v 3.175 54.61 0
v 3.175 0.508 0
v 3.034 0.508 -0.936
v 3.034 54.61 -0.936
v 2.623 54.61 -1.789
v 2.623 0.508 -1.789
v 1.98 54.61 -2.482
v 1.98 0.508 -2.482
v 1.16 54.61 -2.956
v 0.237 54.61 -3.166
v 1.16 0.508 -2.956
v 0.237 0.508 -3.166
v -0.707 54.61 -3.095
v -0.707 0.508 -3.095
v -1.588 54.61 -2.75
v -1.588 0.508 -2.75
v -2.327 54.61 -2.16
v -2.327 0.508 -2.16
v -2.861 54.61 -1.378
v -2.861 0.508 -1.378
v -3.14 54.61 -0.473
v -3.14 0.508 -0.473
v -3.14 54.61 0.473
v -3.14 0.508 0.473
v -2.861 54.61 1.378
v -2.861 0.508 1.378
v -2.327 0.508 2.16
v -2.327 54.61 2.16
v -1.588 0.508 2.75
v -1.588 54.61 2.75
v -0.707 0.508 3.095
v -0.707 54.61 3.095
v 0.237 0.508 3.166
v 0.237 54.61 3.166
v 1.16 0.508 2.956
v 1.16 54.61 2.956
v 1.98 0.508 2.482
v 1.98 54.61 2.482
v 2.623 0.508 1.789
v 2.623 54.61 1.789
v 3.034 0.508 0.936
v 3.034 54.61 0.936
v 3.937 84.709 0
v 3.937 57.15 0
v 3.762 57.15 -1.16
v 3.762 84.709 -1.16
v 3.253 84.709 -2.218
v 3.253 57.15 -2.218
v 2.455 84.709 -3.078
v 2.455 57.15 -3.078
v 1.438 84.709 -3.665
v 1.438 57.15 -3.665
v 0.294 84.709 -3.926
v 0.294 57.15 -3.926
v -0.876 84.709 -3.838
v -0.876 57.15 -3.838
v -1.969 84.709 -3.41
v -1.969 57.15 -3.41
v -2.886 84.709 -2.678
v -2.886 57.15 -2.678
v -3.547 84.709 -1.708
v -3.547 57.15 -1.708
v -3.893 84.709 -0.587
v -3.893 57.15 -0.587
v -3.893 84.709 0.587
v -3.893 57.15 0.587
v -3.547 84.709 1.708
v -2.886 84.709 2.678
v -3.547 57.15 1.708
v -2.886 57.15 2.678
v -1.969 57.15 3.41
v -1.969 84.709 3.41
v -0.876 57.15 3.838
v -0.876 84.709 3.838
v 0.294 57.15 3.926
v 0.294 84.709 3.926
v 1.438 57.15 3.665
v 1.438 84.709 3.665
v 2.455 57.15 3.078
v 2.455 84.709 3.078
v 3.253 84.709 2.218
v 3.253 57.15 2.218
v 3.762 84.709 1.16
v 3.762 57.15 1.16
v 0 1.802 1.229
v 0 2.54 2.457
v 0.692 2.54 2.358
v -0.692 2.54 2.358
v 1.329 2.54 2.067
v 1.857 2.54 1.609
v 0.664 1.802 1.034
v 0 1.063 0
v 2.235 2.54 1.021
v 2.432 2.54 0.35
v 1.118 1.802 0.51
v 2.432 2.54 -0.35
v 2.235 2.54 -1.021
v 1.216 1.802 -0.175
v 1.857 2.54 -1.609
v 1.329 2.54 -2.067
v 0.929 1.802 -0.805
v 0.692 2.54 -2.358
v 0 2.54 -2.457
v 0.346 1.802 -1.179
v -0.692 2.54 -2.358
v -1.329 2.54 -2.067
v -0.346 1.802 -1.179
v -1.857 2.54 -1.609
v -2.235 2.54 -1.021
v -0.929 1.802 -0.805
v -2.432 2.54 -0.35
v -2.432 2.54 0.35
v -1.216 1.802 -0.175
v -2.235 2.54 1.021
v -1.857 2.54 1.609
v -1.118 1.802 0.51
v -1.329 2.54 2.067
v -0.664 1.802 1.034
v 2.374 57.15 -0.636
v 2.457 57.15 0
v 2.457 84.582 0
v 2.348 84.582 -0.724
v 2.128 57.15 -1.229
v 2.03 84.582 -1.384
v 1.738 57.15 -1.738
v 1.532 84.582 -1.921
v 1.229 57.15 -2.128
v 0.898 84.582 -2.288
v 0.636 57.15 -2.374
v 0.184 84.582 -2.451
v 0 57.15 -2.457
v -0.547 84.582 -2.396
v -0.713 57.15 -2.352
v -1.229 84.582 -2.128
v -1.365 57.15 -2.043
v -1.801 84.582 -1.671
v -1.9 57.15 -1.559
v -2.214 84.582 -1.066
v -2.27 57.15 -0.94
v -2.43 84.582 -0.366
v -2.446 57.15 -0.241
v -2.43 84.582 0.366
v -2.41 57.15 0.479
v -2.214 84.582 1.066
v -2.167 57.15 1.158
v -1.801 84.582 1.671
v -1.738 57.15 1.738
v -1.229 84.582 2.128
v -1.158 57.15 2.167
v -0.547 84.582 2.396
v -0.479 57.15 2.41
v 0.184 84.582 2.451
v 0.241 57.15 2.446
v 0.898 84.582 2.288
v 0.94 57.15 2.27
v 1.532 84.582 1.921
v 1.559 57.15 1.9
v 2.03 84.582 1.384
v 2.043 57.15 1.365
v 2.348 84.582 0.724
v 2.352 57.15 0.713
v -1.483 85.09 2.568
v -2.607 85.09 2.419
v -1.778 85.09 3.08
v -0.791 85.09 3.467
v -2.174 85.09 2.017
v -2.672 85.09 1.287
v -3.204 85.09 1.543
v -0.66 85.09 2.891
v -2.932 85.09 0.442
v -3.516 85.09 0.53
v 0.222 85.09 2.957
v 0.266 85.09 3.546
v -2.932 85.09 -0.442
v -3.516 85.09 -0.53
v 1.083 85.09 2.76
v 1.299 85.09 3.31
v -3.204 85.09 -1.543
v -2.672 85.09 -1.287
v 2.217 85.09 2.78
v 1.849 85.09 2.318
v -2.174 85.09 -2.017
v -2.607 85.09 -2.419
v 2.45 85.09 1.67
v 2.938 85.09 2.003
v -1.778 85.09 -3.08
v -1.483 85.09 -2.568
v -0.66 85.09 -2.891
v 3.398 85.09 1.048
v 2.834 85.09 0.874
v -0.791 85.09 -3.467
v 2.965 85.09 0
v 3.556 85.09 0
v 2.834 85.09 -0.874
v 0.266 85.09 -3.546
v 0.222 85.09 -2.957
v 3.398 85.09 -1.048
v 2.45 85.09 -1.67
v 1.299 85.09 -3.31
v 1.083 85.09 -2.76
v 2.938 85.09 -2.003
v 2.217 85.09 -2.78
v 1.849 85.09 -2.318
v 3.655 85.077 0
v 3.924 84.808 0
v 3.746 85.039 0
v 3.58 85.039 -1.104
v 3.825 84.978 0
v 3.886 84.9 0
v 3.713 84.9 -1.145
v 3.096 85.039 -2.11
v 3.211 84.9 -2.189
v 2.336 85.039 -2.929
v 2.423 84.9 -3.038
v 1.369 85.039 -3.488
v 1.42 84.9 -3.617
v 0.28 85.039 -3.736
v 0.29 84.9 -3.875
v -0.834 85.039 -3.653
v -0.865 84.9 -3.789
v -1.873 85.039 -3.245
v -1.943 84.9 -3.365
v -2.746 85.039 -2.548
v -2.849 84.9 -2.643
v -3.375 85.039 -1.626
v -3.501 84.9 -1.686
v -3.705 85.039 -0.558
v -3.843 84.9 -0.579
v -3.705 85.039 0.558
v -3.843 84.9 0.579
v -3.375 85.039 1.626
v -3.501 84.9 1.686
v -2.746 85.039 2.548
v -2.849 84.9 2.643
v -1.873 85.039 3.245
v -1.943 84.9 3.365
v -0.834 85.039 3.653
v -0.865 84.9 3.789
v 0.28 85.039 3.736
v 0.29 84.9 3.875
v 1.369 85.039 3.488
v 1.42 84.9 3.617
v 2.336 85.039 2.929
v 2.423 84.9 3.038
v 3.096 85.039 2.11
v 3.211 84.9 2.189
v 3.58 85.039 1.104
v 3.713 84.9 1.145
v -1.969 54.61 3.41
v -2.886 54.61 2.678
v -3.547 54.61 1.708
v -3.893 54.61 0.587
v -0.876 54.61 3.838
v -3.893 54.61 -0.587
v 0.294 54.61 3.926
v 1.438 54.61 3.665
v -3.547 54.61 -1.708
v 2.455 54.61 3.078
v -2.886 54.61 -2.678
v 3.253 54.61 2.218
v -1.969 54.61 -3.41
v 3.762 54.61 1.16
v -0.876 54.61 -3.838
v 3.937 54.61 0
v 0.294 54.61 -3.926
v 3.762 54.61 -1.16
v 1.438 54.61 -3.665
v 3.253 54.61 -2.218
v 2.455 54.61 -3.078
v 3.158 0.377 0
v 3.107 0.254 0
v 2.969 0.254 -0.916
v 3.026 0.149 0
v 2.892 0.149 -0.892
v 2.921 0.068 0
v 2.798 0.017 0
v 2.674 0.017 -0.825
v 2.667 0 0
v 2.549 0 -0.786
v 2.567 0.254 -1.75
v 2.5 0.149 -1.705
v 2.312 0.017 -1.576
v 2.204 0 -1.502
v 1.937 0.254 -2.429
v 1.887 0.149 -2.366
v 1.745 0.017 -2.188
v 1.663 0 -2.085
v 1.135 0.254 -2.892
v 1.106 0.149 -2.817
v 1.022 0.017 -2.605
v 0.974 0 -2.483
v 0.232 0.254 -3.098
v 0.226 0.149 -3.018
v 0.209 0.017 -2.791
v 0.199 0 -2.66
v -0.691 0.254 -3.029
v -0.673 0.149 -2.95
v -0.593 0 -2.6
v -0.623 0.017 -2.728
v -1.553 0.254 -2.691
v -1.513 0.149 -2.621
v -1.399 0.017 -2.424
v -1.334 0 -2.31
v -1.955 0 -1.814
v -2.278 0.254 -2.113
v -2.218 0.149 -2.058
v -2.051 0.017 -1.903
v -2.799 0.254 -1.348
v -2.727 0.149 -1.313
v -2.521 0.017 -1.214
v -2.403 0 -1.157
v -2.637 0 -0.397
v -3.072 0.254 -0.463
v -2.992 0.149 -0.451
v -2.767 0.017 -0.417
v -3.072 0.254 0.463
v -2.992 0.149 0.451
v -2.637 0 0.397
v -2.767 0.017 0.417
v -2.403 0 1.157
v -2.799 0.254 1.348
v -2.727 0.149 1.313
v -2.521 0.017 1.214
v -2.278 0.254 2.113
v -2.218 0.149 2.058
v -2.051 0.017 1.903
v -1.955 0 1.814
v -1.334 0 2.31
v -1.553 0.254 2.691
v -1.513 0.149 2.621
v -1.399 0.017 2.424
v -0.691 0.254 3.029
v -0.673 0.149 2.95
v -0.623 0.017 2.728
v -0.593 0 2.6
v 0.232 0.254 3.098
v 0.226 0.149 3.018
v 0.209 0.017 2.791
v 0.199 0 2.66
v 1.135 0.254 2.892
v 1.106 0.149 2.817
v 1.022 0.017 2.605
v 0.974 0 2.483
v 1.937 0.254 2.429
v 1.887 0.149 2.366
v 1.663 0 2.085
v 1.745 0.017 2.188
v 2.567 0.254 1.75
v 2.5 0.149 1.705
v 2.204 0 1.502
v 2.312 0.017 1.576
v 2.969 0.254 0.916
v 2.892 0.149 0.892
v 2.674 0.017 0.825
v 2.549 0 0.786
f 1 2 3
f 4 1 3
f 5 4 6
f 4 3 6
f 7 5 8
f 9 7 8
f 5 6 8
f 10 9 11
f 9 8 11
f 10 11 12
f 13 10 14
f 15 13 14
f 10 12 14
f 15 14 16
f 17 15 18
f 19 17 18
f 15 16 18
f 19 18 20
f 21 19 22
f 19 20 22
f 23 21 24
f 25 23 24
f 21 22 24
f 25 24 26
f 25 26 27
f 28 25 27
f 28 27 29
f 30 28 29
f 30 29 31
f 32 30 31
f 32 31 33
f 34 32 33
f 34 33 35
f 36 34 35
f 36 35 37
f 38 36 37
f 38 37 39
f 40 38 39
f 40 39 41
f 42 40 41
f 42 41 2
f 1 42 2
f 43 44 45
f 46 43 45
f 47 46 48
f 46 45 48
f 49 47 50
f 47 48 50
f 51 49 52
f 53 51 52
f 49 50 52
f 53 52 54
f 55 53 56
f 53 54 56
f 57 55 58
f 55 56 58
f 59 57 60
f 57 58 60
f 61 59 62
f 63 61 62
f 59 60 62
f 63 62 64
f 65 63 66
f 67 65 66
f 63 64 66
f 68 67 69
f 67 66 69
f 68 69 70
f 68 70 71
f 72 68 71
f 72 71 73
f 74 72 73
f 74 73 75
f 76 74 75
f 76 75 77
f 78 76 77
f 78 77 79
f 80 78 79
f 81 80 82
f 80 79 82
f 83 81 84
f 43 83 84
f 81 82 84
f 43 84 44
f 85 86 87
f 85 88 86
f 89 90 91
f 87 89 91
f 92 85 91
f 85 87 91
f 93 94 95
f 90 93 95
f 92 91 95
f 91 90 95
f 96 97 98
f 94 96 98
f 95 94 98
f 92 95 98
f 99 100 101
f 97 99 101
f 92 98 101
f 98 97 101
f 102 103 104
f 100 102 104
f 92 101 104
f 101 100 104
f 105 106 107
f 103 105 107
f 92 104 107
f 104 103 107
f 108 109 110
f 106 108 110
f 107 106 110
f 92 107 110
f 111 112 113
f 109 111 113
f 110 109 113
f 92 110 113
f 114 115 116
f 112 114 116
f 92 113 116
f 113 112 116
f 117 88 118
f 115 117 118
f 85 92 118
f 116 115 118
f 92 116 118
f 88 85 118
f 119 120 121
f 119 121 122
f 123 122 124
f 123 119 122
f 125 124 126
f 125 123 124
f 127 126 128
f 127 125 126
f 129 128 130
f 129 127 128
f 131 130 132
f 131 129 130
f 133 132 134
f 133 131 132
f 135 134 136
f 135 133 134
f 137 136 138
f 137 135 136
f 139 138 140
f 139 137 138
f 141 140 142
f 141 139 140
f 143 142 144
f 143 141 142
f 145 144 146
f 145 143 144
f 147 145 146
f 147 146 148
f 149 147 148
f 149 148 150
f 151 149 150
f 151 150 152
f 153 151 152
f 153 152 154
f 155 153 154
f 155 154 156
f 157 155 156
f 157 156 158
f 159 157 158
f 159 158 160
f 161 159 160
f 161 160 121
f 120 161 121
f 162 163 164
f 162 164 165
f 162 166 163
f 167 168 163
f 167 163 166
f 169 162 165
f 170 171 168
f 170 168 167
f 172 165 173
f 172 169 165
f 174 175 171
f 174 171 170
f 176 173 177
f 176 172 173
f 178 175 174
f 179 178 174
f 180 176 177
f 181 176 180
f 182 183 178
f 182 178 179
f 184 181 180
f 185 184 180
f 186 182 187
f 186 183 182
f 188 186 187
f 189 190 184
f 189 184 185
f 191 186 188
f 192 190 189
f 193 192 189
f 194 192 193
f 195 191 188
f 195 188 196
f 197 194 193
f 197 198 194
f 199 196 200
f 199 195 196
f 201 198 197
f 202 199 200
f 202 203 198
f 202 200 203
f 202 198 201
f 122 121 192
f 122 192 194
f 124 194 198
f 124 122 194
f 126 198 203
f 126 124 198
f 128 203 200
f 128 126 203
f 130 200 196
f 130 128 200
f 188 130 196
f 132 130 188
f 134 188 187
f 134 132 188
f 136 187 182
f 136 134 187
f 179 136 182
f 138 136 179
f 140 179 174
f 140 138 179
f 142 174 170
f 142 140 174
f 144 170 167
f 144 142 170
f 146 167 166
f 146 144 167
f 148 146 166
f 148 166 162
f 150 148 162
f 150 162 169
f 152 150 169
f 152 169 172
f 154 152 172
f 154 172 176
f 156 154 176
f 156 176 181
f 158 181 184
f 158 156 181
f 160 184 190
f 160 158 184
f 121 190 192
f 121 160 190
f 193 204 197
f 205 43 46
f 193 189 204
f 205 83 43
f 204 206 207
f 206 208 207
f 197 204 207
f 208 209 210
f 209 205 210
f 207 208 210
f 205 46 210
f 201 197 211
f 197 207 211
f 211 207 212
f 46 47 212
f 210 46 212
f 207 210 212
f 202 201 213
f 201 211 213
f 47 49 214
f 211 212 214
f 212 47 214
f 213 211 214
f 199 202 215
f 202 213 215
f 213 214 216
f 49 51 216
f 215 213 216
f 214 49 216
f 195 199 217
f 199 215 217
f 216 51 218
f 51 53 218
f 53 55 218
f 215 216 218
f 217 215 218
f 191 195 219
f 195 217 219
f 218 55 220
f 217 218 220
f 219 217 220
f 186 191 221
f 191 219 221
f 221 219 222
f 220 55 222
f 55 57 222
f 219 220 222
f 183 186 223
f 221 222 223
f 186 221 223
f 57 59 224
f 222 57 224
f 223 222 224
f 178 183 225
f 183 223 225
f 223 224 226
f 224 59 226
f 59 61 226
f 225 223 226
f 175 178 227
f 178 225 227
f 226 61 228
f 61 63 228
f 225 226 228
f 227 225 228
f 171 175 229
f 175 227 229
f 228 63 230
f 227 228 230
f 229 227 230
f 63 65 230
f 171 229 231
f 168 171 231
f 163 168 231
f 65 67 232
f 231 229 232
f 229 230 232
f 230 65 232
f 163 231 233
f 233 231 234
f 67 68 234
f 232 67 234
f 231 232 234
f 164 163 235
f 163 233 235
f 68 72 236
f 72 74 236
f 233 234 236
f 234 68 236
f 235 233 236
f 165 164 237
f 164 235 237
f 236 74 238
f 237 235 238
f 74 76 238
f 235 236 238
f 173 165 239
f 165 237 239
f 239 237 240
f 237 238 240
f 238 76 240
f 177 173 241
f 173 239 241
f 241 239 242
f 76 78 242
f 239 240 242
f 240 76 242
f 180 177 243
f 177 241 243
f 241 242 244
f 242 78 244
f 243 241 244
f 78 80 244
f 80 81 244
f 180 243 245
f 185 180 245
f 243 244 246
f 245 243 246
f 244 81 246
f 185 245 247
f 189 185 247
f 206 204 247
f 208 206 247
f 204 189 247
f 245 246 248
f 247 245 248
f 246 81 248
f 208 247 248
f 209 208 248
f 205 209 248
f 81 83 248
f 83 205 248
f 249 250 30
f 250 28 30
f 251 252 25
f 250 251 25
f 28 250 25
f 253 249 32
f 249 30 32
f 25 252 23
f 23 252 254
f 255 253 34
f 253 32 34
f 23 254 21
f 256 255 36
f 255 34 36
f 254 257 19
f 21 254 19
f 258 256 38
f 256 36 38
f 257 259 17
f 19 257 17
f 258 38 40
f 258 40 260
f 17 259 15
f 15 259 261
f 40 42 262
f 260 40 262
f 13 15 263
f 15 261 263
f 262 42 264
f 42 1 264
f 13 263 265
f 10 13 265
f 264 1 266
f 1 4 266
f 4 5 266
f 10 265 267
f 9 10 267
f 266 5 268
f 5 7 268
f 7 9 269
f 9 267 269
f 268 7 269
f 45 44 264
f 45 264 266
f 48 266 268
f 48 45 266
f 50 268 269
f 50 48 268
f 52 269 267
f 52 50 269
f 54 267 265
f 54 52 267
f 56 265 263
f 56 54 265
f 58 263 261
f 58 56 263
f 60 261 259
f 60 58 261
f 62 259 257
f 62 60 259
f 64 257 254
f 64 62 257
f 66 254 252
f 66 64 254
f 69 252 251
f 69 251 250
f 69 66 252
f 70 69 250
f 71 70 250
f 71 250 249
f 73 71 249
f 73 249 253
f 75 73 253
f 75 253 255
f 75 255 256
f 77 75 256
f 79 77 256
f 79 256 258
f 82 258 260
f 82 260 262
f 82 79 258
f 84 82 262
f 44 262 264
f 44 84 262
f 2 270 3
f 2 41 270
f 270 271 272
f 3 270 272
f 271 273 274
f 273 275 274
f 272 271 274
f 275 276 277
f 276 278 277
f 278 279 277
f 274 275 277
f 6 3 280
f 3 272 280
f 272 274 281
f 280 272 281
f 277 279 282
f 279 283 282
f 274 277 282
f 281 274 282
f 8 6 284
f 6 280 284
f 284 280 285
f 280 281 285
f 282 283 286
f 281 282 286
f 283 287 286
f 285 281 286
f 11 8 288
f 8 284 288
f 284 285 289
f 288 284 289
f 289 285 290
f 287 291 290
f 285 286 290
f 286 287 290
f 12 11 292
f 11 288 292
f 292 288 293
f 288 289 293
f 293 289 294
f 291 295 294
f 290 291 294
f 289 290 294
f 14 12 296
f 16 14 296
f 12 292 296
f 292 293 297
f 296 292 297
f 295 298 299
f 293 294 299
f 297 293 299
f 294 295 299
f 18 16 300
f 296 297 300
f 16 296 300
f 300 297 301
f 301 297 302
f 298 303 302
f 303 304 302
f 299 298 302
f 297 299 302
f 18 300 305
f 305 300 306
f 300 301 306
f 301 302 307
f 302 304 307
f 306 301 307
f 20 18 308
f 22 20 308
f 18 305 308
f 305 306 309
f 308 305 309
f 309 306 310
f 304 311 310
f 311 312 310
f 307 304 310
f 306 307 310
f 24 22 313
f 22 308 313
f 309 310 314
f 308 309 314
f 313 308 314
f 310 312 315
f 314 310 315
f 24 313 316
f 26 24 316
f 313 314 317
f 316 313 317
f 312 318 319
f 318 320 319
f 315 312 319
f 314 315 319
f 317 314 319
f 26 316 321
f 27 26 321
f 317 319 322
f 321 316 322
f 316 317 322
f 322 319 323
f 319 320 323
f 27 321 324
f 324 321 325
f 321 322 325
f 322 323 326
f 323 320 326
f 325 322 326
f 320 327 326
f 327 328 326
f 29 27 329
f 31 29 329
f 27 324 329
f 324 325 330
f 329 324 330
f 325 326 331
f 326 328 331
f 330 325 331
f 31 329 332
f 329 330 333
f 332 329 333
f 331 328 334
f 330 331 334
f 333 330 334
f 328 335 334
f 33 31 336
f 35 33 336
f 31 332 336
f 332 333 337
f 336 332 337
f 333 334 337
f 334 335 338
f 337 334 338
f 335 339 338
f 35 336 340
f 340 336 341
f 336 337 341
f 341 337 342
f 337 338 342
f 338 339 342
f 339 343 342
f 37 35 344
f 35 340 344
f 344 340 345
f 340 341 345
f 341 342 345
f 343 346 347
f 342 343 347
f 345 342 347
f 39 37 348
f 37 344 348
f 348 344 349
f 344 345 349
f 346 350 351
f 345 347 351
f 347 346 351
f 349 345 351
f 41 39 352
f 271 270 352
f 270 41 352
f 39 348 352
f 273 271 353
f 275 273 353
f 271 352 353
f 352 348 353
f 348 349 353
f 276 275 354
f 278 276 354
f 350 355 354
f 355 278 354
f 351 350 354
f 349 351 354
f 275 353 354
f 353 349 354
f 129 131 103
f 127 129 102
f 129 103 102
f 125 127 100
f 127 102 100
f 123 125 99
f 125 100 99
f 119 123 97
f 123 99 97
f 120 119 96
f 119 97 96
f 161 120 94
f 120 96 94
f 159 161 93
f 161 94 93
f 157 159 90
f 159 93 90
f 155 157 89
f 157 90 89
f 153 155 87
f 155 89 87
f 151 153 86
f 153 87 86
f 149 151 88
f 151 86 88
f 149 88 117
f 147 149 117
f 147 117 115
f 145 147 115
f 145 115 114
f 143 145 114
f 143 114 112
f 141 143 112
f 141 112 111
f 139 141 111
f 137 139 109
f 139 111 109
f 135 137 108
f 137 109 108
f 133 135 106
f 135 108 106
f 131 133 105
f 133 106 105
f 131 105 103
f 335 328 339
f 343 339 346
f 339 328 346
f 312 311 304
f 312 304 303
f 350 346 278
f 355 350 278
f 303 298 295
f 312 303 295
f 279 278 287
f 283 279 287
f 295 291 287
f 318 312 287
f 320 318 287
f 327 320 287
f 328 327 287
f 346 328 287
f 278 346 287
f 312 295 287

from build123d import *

# Parameters (mm, degrees)
SKETCH1_R                        = 3.175
BOSS_EXTRUDE1_DEPTH              = 57.15
F_10_0_1935_DIAMETER_HOLE1_D     = 4.9149
F_10_0_1935_DIAMETER_HOLE1_DEPTH = 54.61
F_10_0_1935_DIAMETER_HOLE1_TIP   = 1.476584928
SKETCH5_R                        = 3.937
SKETCH5_R_2                      = 3.175
BOSS_EXTRUDE2_DEPTH              = 2.54
FILLET1_R                        = 0.508
SKETCH6_R                        = 3.937
SKETCH6_R_2                      = 2.45745
BOSS_EXTRUDE3_DEPTH              = 27.94
CHAMFER1_SIZE                    = 0.508
FILLET2_R                        = 0.381


with BuildPart() as part:
    # Sketch1 → Boss-Extrude1 (new body)
    with BuildSketch(Plane(origin=(0, 0, 0), x_dir=(1, 0, 0), z_dir=(0, 1, 0))):
        Circle(SKETCH1_R)
    extrude(amount=BOSS_EXTRUDE1_DEPTH)

    # #10 (0.1935) Diameter Hole1
    with Locations(Plane.ZX.offset(57.15)):
        with Locations((0, 0)):
            Hole(F_10_0_1935_DIAMETER_HOLE1_D / 2, depth=F_10_0_1935_DIAMETER_HOLE1_DEPTH)
            with Locations((0, 0, -(F_10_0_1935_DIAMETER_HOLE1_DEPTH + F_10_0_1935_DIAMETER_HOLE1_TIP / 2))):  # 118° drill point
                Cone(0, F_10_0_1935_DIAMETER_HOLE1_D / 2, F_10_0_1935_DIAMETER_HOLE1_TIP, mode=Mode.SUBTRACT)

    # Sketch5 → Boss-Extrude2 (add)
    with BuildSketch(Plane(origin=(0, 57.15, 0), x_dir=(1, 0, 0), z_dir=(0, 1, 0))):
        Circle(SKETCH5_R)
        Circle(SKETCH5_R_2, mode=Mode.SUBTRACT)
    extrude(amount=-BOSS_EXTRUDE2_DEPTH)

    # Fillet1
    fillet1_edges = [part.edges().sort_by_distance(p)[0] for p in [
        (-3.175, 0, 0),
    ]]
    fillet(fillet1_edges, radius=FILLET1_R)

    # Sketch6 → Boss-Extrude3 (add)
    with BuildSketch(Plane(origin=(0, 57.15, 0), x_dir=(1, 0, 0), z_dir=(0, 1, 0))):
        Circle(SKETCH6_R)
        Circle(SKETCH6_R_2, mode=Mode.SUBTRACT)
    extrude(amount=BOSS_EXTRUDE3_DEPTH)

    # Chamfer1
    chamfer1_edges = [part.edges().sort_by_distance(p)[0] for p in [
        (-2.45745, 85.09, 0),
    ]]
    chamfer(chamfer1_edges, length=CHAMFER1_SIZE)

    # Fillet2
    fillet2_edges = [part.edges().sort_by_distance(p)[0] for p in [
        (-3.937, 85.09, 0),
    ]]
    fillet(fillet2_edges, radius=FILLET2_R)


solid = part.part
